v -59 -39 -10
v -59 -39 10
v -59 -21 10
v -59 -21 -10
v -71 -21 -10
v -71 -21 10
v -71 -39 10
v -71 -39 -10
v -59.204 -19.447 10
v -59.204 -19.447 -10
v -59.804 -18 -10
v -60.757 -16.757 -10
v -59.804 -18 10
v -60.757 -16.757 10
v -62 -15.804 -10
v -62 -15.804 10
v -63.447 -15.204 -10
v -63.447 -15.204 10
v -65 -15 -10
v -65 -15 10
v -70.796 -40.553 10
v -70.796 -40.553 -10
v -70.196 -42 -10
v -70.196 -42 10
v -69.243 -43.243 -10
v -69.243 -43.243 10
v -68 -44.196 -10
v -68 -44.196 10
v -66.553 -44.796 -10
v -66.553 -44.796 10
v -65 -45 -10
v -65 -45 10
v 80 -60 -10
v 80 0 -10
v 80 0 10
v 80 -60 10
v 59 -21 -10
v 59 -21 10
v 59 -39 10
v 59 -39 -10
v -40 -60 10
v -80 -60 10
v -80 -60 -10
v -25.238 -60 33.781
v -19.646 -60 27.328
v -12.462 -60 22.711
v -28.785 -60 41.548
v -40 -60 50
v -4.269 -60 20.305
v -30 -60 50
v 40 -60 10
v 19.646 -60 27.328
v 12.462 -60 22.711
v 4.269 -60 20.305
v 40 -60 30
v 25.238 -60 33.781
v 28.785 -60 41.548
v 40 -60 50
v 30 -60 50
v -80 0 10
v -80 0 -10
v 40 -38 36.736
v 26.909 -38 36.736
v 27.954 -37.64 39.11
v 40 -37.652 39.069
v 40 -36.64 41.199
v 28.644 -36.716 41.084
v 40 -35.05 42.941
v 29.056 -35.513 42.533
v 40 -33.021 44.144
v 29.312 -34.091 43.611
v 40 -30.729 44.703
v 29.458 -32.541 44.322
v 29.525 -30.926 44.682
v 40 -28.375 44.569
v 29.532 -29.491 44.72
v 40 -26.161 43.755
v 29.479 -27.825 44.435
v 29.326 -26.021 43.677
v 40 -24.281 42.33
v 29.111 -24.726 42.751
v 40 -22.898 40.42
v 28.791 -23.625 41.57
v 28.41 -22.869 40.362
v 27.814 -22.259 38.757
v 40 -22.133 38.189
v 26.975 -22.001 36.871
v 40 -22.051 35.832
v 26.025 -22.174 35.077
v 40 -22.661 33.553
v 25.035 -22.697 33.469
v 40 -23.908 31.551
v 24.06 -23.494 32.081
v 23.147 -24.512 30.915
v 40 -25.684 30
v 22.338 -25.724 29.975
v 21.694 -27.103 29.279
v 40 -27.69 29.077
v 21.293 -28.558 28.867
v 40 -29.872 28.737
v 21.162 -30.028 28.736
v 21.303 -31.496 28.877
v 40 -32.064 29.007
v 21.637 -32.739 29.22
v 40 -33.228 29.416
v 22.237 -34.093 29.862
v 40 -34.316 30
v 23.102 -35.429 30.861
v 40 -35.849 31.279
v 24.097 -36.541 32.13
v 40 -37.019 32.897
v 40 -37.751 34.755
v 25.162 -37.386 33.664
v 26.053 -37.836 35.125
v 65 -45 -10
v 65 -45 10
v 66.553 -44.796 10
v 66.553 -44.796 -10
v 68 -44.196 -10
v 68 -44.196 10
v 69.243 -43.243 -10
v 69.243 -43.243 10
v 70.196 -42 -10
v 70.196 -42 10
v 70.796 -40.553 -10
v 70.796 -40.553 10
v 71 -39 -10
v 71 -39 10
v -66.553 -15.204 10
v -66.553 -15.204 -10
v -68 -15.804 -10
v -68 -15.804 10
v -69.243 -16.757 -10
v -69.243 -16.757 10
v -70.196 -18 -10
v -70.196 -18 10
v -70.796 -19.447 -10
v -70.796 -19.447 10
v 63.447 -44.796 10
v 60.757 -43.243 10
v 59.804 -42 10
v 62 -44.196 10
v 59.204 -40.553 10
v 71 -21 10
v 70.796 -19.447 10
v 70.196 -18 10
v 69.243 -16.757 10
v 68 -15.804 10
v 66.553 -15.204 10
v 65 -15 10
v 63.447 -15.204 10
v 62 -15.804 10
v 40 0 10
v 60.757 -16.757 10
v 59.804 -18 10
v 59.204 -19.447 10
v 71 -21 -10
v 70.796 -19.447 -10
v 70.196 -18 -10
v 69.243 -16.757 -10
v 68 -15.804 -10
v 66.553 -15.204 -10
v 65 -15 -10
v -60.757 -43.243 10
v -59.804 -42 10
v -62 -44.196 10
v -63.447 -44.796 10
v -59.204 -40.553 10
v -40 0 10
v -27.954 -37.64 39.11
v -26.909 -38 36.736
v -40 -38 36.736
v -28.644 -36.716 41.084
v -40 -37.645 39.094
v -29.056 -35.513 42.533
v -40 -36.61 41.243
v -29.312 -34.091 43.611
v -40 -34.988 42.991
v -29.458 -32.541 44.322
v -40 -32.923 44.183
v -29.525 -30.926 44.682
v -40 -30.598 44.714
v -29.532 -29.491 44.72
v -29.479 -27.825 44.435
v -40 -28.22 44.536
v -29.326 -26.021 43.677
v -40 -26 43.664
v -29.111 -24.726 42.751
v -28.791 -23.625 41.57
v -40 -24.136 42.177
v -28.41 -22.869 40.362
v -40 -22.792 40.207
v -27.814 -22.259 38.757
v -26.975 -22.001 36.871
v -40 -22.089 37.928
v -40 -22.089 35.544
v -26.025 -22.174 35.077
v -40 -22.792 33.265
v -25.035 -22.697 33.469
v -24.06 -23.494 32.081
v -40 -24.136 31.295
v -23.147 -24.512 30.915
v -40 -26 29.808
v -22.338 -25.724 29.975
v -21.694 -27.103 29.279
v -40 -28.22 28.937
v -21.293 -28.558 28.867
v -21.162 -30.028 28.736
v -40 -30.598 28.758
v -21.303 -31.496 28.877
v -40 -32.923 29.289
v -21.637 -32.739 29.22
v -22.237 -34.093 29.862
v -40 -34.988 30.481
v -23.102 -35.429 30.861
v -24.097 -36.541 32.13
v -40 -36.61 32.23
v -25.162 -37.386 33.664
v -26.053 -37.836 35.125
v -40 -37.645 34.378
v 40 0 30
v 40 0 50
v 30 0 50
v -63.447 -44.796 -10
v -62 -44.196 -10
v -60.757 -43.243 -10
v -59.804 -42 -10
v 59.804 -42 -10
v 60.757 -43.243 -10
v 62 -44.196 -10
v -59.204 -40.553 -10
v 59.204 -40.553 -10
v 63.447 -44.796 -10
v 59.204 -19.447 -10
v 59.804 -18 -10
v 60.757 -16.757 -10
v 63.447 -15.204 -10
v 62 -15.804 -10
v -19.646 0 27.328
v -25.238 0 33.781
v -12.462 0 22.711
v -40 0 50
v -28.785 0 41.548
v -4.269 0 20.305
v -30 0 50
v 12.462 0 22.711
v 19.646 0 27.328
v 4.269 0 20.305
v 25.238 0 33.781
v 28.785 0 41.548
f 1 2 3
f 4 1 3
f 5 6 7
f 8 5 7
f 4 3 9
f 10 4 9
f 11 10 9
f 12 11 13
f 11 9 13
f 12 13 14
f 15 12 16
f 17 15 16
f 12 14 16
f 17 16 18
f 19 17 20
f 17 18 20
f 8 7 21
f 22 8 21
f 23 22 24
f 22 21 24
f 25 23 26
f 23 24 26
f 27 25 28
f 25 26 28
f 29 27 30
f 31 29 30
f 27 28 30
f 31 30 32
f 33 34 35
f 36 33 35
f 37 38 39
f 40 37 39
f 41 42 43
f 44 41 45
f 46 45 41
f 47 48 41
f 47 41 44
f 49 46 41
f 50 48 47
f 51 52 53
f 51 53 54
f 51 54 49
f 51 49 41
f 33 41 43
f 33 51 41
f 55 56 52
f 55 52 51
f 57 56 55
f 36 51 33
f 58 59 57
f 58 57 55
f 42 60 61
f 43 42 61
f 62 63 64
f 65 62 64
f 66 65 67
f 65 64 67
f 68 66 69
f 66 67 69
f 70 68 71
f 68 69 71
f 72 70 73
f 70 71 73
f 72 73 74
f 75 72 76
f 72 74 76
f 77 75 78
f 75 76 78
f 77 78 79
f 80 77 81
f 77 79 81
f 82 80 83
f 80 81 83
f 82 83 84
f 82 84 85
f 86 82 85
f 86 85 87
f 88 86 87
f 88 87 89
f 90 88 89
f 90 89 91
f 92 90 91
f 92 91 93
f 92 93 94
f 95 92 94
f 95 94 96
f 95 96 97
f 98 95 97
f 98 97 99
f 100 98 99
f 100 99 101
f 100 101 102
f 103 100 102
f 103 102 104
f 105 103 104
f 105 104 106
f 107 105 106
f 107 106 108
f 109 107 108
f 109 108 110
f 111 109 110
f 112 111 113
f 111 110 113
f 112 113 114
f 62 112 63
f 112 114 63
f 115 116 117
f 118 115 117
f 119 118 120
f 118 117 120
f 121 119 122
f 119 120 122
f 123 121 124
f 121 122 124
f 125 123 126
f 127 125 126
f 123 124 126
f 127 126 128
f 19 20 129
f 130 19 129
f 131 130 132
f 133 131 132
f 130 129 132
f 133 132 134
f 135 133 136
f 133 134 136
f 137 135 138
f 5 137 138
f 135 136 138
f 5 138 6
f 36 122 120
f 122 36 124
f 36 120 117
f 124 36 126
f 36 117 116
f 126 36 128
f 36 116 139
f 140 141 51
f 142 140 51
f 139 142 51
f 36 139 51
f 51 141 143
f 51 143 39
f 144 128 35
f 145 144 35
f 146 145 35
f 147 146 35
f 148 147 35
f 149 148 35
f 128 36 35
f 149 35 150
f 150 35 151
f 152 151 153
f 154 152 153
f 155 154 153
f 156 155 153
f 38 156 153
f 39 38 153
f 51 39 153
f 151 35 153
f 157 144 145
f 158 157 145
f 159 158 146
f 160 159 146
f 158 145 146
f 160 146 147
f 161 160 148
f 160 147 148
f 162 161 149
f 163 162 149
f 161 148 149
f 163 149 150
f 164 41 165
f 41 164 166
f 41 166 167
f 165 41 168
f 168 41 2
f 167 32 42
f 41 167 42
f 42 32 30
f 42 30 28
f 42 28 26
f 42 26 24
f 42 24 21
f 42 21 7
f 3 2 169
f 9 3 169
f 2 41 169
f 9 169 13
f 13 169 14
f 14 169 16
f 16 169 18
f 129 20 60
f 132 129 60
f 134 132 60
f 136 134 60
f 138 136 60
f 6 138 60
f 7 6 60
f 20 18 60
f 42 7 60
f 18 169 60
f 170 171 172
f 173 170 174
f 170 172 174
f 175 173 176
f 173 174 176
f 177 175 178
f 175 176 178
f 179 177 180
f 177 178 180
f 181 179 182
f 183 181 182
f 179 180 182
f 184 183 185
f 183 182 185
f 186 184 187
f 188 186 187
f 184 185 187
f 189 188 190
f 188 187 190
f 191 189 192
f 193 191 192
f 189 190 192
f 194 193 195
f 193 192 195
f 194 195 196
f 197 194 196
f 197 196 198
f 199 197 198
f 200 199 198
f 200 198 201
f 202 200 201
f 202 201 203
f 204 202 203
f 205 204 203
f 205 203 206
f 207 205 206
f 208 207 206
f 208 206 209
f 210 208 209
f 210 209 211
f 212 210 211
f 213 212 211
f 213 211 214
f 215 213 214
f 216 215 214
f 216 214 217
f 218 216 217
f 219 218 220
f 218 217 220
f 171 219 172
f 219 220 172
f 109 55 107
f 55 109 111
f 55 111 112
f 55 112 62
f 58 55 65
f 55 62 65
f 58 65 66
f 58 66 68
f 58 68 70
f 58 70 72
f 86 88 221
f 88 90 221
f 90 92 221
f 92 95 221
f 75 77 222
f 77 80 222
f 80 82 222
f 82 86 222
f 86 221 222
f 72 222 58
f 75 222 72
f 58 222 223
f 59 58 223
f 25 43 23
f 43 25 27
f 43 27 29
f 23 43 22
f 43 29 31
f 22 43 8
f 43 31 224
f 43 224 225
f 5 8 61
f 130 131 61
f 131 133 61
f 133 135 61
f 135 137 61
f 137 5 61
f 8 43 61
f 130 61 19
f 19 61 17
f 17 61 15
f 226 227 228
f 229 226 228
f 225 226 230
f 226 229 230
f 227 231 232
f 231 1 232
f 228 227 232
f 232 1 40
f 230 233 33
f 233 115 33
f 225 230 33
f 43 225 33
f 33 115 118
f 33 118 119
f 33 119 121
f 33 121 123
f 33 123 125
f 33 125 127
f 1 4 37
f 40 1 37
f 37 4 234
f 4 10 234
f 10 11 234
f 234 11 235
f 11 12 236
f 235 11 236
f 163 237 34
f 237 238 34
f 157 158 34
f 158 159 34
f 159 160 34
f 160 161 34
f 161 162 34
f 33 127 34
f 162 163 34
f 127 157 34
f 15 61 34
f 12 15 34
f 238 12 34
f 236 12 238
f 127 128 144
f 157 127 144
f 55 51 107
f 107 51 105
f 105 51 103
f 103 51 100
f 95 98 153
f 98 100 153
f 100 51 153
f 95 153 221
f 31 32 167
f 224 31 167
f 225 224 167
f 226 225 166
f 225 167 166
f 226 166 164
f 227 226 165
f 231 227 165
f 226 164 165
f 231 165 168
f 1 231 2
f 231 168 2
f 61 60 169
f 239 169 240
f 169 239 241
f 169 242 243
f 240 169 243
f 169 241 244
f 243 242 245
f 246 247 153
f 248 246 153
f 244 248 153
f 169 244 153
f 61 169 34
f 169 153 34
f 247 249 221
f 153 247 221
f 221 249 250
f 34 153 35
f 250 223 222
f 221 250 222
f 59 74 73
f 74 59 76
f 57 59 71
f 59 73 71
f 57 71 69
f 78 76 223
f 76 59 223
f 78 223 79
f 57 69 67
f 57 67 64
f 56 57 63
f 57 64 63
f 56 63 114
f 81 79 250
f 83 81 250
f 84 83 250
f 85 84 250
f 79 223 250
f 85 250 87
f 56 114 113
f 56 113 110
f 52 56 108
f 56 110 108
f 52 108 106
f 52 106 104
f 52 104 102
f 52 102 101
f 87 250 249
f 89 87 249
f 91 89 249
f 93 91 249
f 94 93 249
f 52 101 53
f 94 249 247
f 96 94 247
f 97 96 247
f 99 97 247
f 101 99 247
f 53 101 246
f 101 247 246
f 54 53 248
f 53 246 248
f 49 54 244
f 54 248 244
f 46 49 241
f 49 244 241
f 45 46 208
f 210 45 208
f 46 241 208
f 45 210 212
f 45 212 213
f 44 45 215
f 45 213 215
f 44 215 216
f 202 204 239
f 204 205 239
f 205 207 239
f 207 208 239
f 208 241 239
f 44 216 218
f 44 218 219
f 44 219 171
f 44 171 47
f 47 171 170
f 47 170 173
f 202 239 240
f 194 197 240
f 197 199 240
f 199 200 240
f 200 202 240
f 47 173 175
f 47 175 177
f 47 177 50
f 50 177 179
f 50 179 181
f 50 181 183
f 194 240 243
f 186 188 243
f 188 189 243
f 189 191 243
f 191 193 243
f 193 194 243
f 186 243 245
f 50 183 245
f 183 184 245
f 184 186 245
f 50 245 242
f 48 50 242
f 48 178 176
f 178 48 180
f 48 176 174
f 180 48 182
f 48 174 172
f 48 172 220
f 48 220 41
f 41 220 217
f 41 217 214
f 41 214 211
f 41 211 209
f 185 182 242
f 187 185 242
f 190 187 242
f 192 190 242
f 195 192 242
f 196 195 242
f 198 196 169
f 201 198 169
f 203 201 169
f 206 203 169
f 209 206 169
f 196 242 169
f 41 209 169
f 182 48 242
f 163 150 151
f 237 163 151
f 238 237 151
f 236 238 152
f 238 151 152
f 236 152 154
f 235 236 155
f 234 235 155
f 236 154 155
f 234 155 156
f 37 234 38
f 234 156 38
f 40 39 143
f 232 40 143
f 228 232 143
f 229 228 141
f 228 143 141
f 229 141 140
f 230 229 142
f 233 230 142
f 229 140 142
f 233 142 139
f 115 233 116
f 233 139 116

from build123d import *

# Parameters (mm, degrees)
F1_DEPTH = 60
F2_R     = 8
F3_DEPTH = 120.001001
F6_DEPTH = 20.001


with BuildPart() as f1:
    # F0 (on Front) → F1 (new body)
    with BuildSketch(Plane.XZ):
        with BuildLine():
            Line((-80, 10), (-80, -10))
            Line((-80, -10), (80, -10))
            Line((80, -10), (80, 10))
            Line((80, 10), (40, 10))
            Line((40, 10), (40.000001, 30))
            Line((40.000001, 30), (40.000001, 50))
            Line((40.000001, 50), (30.000001, 50))
            ThreePointArc((30.000001, 50), (1e-06, 20), (-29.999999, 50))
            Line((-29.999999, 50), (-39.999999, 50))
            Line((-39.999999, 50), (-40, 10))
            Line((-40, 10), (-80, 10))
        make_face()
    extrude(amount=F1_DEPTH)

    # F2 (on face) → F3 (cut, through all)
    with BuildSketch(Plane(origin=(-40, 0, 1e-06), x_dir=(0, -1, 0), z_dir=(-1, 0, 0))):
        with Locations((30, 36.73611)):
            Circle(F2_R)
    extrude(amount=-F3_DEPTH, mode=Mode.SUBTRACT)

    # F4 (on face) + F5 (on face) → F6 (cut, through all)
    with BuildSketch(Plane.XY.offset(10)):
        with BuildLine():
            Line((-71, -21), (-71, -39))
            ThreePointArc((-71, -39), (-69.242641, -43.242641), (-65, -45))
            ThreePointArc((-65, -45), (-60.757359, -43.242641), (-59, -39))
            Line((-59, -39), (-59, -21))
            ThreePointArc((-59, -21), (-60.757359, -16.757359), (-65, -15))
            ThreePointArc((-65, -15), (-69.242641, -16.757359), (-71, -21))
        make_face()
    with BuildSketch(Plane.XY.offset(10)):
        with BuildLine():
            Line((59, -21), (59, -39))
            ThreePointArc((59, -39), (60.757359, -43.242641), (65, -45))
            ThreePointArc((65, -45), (69.242641, -43.242641), (71, -39))
            Line((71, -39), (71, -21))
            ThreePointArc((71, -21), (69.242641, -16.757359), (65, -15))
            ThreePointArc((65, -15), (60.757359, -16.757359), (59, -21))
        make_face()
    extrude(amount=-F6_DEPTH, mode=Mode.SUBTRACT)


solid = f1.part
